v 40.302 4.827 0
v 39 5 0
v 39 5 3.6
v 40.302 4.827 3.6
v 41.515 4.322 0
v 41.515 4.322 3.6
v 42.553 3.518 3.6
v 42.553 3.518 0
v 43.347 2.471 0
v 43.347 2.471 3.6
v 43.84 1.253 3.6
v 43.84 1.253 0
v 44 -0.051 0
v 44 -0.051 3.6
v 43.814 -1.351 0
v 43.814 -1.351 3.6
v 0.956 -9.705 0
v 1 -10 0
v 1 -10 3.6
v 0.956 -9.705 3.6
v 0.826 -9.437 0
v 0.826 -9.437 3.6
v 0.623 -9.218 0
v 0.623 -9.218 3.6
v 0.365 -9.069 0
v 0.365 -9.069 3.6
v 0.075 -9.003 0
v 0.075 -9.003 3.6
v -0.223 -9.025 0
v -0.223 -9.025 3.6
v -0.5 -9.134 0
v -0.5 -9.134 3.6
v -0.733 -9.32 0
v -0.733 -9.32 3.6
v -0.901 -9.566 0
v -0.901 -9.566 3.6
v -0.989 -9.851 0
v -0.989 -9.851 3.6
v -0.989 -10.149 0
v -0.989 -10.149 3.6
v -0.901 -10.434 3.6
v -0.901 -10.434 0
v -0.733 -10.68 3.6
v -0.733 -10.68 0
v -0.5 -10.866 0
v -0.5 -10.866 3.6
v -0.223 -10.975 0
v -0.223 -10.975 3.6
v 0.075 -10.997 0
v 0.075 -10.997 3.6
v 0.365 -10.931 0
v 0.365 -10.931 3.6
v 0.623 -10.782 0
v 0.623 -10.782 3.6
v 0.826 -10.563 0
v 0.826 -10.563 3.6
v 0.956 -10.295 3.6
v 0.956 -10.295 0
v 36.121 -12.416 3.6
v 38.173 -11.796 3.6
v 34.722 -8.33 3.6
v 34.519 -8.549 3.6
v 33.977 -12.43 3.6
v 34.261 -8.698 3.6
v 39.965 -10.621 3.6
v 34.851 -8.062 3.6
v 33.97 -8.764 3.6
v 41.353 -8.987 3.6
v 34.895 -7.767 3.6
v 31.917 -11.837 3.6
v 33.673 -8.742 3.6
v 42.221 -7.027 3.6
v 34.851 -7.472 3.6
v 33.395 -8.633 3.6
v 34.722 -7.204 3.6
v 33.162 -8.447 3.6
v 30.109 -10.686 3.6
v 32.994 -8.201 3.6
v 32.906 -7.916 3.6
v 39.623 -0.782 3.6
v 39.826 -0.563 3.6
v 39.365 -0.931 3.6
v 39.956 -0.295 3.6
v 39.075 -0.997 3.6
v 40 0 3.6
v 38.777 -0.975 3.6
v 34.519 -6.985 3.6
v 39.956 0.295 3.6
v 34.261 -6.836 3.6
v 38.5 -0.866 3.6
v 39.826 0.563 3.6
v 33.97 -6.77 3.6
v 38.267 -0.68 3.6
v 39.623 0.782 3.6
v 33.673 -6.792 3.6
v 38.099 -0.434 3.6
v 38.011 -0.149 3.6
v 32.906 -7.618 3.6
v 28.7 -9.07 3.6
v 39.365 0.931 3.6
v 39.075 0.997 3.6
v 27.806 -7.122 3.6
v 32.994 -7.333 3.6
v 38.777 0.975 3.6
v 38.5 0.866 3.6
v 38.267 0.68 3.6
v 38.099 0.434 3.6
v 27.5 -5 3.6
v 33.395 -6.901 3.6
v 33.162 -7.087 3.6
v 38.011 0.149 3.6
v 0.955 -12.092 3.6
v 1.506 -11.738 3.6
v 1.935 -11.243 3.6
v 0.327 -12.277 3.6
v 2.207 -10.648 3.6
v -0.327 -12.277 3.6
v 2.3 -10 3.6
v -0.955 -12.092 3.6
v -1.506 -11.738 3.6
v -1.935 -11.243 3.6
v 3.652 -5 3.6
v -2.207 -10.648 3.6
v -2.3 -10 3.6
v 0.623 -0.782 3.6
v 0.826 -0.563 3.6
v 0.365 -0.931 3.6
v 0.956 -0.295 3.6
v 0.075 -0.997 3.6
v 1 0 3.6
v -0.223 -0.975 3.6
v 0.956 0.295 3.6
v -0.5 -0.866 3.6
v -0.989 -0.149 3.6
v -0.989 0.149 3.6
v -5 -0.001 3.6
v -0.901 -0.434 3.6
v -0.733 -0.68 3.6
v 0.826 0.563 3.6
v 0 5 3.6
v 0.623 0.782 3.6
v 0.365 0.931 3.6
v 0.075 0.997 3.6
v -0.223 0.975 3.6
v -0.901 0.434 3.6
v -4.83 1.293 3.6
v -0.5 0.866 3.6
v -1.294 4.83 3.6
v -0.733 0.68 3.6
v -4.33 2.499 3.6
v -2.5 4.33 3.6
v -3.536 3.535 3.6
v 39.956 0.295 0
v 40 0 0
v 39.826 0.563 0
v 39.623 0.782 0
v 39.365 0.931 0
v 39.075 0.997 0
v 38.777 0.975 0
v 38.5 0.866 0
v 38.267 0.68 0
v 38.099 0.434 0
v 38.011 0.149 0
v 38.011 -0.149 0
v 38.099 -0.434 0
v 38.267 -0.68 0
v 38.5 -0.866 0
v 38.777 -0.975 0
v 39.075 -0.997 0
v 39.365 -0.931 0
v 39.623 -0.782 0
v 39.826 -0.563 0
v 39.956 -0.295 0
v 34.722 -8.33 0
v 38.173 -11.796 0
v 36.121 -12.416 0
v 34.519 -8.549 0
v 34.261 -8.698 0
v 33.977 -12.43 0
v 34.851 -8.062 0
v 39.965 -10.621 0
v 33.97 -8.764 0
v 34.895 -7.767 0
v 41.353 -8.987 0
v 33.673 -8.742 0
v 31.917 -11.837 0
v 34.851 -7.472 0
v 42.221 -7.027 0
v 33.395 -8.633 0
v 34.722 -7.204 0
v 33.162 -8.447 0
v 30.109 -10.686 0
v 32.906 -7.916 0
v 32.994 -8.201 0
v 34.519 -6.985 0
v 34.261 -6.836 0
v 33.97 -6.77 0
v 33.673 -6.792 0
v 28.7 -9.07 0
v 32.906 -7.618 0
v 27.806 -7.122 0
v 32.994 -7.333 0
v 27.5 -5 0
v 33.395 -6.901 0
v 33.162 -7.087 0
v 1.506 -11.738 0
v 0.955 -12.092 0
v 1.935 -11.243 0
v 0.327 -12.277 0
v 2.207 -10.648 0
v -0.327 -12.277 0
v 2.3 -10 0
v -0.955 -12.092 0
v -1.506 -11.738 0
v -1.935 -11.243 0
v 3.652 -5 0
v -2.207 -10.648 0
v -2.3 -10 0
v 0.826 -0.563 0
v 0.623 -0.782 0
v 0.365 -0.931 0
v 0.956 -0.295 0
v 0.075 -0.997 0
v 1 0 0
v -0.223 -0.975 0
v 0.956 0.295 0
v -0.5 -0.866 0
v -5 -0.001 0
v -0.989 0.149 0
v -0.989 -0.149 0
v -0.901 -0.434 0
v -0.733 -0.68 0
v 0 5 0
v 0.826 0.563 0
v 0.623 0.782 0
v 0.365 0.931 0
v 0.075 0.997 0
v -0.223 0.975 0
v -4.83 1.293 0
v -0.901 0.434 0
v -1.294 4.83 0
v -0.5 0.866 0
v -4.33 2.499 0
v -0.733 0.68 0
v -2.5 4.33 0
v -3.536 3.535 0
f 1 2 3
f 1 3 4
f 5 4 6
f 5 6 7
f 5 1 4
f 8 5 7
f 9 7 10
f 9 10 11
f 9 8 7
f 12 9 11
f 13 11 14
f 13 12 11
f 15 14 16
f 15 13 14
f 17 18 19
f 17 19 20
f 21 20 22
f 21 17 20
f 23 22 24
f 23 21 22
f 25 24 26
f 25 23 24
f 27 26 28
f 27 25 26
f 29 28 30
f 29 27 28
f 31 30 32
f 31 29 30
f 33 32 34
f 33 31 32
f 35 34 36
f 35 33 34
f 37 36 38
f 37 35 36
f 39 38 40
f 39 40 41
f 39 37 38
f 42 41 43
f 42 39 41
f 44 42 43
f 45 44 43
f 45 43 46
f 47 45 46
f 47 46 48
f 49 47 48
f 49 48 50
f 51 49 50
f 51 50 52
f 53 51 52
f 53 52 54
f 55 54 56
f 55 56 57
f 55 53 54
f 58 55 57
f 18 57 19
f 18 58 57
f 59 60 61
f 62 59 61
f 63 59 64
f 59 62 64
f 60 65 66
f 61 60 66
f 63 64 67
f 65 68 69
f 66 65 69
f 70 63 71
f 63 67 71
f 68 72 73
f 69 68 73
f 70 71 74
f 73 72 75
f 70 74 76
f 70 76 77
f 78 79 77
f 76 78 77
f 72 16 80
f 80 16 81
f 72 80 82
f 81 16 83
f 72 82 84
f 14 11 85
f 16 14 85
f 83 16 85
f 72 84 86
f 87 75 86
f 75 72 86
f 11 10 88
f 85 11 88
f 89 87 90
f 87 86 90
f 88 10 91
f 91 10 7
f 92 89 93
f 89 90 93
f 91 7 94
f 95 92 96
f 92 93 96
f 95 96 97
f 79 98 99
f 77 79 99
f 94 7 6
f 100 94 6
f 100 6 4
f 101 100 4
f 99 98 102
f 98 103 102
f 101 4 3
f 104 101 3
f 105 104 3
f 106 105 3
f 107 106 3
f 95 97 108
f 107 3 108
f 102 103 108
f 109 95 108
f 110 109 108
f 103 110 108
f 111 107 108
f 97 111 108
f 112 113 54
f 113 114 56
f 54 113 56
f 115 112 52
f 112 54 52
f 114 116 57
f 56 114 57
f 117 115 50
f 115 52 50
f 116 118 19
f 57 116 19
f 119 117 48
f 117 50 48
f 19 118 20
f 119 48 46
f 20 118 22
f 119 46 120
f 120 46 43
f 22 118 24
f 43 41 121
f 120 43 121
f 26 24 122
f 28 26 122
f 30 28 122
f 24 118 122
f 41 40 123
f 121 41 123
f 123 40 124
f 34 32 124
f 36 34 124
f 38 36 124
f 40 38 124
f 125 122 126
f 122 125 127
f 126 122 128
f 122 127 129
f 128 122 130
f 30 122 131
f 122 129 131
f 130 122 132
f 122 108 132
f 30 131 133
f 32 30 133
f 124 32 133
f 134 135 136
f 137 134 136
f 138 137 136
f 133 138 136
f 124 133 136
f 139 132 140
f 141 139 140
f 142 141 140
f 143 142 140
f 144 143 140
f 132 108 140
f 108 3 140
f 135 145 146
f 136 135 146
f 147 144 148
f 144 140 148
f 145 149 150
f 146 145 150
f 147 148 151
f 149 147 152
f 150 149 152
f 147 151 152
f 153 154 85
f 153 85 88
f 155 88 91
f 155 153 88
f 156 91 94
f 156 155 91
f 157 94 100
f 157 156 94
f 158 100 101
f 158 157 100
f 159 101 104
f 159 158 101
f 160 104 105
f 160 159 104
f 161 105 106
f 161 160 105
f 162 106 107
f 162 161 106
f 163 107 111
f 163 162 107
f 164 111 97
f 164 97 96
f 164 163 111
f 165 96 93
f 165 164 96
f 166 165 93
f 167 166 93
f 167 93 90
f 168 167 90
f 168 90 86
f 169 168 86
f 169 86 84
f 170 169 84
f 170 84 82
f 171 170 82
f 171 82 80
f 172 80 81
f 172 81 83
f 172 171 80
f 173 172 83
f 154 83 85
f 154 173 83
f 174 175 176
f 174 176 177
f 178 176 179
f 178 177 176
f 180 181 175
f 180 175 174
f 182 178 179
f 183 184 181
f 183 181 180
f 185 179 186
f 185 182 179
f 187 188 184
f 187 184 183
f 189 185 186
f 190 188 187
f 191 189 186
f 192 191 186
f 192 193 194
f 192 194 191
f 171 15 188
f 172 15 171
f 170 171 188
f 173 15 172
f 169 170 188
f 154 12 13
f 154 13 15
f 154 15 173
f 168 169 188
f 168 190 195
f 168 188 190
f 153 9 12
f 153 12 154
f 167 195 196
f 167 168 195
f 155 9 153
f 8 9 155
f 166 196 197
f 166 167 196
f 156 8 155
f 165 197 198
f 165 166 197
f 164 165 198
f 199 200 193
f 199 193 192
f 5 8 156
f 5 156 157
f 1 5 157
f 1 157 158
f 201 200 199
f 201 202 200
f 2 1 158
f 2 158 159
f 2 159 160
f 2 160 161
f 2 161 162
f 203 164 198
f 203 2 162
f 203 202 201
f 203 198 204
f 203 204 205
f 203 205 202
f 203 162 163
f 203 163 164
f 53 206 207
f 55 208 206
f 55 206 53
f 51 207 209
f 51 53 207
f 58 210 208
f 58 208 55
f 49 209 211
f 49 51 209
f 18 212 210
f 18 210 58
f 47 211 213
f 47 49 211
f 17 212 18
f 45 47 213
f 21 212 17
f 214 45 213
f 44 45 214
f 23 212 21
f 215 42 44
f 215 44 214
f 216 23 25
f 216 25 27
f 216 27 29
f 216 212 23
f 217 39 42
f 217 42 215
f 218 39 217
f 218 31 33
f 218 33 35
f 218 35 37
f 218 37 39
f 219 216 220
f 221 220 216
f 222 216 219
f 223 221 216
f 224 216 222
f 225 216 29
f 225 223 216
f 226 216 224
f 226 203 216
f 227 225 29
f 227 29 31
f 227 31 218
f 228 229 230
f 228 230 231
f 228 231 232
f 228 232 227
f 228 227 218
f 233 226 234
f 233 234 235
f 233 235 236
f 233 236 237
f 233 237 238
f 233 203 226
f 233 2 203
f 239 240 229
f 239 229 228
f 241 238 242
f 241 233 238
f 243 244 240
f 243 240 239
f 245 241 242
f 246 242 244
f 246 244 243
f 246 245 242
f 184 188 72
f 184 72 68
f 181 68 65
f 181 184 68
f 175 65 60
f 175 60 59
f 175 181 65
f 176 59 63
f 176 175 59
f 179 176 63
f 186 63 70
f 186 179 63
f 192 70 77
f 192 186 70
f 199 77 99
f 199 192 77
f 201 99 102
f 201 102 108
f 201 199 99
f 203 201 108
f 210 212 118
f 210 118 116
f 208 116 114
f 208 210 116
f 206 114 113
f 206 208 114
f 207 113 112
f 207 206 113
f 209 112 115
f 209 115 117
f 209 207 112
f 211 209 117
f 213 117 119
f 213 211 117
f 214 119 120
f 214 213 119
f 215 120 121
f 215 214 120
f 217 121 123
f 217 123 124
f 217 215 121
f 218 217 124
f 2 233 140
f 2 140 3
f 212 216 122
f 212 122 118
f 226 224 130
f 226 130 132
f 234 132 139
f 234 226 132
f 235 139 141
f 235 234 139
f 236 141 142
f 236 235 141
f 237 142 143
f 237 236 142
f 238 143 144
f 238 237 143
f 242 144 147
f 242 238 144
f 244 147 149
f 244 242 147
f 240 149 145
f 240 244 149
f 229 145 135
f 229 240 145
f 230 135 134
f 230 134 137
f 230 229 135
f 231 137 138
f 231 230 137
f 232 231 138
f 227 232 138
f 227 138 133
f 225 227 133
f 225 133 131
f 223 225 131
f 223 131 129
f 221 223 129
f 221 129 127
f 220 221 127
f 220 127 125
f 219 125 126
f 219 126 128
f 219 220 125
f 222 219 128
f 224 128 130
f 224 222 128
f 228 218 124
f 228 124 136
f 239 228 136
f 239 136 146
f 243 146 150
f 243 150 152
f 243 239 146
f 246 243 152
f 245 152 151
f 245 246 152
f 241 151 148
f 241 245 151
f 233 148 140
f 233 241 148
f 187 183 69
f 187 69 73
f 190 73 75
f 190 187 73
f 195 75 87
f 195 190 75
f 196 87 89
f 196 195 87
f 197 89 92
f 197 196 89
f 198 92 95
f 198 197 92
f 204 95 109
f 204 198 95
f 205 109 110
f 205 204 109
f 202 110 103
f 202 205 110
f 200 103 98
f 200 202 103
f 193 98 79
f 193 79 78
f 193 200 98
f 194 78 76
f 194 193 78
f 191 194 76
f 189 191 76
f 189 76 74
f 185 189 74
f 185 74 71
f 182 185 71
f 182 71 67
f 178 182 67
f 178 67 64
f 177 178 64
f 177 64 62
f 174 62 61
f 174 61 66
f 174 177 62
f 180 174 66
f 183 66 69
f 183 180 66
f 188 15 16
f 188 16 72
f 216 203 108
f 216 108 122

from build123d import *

# Parameters (mm, degrees)
SKETCH1_R           = 1
BOSS_EXTRUDE1_DEPTH = 3.6


with BuildPart() as part:
    # Sketch1 → Boss-Extrude1 (new body)
    with BuildSketch(Plane.XY):
        with BuildLine():
            Line((0, 5), (39, 5))
            ThreePointArc((39, 5), (42.984713636, 3.020274365), (43.813971379, -1.351177103))
            Line((43.813971379, -1.351177103), (42.220957068, -7.026765655))
            ThreePointArc((42.220957068, -7.026765655), (33.977057678, -12.429911776), (27.5, -5))
            Line((27.5, -5), (3.651745661, -5))
            Line((3.651745661, -5), (2.3, -10))
            ThreePointArc((2.3, -10), (0, -12.3), (-2.3, -10))
            Line((-2.3, -10), (-4.999999906, -0.00096864))
            ThreePointArc((-4.999999906, -0.00096864), (-3.535876355, 3.535191424), (0, 5))
        make_face()
        with Locations((0, -10)):
            Circle(SKETCH1_R, mode=Mode.SUBTRACT)
        Circle(SKETCH1_R, mode=Mode.SUBTRACT)
        with Locations((39, 0)):
            Circle(SKETCH1_R, mode=Mode.SUBTRACT)
        with Locations((33.8952959, -7.766976867)):
            Circle(SKETCH1_R, mode=Mode.SUBTRACT)
    extrude(amount=BOSS_EXTRUDE1_DEPTH)


solid = part.part
